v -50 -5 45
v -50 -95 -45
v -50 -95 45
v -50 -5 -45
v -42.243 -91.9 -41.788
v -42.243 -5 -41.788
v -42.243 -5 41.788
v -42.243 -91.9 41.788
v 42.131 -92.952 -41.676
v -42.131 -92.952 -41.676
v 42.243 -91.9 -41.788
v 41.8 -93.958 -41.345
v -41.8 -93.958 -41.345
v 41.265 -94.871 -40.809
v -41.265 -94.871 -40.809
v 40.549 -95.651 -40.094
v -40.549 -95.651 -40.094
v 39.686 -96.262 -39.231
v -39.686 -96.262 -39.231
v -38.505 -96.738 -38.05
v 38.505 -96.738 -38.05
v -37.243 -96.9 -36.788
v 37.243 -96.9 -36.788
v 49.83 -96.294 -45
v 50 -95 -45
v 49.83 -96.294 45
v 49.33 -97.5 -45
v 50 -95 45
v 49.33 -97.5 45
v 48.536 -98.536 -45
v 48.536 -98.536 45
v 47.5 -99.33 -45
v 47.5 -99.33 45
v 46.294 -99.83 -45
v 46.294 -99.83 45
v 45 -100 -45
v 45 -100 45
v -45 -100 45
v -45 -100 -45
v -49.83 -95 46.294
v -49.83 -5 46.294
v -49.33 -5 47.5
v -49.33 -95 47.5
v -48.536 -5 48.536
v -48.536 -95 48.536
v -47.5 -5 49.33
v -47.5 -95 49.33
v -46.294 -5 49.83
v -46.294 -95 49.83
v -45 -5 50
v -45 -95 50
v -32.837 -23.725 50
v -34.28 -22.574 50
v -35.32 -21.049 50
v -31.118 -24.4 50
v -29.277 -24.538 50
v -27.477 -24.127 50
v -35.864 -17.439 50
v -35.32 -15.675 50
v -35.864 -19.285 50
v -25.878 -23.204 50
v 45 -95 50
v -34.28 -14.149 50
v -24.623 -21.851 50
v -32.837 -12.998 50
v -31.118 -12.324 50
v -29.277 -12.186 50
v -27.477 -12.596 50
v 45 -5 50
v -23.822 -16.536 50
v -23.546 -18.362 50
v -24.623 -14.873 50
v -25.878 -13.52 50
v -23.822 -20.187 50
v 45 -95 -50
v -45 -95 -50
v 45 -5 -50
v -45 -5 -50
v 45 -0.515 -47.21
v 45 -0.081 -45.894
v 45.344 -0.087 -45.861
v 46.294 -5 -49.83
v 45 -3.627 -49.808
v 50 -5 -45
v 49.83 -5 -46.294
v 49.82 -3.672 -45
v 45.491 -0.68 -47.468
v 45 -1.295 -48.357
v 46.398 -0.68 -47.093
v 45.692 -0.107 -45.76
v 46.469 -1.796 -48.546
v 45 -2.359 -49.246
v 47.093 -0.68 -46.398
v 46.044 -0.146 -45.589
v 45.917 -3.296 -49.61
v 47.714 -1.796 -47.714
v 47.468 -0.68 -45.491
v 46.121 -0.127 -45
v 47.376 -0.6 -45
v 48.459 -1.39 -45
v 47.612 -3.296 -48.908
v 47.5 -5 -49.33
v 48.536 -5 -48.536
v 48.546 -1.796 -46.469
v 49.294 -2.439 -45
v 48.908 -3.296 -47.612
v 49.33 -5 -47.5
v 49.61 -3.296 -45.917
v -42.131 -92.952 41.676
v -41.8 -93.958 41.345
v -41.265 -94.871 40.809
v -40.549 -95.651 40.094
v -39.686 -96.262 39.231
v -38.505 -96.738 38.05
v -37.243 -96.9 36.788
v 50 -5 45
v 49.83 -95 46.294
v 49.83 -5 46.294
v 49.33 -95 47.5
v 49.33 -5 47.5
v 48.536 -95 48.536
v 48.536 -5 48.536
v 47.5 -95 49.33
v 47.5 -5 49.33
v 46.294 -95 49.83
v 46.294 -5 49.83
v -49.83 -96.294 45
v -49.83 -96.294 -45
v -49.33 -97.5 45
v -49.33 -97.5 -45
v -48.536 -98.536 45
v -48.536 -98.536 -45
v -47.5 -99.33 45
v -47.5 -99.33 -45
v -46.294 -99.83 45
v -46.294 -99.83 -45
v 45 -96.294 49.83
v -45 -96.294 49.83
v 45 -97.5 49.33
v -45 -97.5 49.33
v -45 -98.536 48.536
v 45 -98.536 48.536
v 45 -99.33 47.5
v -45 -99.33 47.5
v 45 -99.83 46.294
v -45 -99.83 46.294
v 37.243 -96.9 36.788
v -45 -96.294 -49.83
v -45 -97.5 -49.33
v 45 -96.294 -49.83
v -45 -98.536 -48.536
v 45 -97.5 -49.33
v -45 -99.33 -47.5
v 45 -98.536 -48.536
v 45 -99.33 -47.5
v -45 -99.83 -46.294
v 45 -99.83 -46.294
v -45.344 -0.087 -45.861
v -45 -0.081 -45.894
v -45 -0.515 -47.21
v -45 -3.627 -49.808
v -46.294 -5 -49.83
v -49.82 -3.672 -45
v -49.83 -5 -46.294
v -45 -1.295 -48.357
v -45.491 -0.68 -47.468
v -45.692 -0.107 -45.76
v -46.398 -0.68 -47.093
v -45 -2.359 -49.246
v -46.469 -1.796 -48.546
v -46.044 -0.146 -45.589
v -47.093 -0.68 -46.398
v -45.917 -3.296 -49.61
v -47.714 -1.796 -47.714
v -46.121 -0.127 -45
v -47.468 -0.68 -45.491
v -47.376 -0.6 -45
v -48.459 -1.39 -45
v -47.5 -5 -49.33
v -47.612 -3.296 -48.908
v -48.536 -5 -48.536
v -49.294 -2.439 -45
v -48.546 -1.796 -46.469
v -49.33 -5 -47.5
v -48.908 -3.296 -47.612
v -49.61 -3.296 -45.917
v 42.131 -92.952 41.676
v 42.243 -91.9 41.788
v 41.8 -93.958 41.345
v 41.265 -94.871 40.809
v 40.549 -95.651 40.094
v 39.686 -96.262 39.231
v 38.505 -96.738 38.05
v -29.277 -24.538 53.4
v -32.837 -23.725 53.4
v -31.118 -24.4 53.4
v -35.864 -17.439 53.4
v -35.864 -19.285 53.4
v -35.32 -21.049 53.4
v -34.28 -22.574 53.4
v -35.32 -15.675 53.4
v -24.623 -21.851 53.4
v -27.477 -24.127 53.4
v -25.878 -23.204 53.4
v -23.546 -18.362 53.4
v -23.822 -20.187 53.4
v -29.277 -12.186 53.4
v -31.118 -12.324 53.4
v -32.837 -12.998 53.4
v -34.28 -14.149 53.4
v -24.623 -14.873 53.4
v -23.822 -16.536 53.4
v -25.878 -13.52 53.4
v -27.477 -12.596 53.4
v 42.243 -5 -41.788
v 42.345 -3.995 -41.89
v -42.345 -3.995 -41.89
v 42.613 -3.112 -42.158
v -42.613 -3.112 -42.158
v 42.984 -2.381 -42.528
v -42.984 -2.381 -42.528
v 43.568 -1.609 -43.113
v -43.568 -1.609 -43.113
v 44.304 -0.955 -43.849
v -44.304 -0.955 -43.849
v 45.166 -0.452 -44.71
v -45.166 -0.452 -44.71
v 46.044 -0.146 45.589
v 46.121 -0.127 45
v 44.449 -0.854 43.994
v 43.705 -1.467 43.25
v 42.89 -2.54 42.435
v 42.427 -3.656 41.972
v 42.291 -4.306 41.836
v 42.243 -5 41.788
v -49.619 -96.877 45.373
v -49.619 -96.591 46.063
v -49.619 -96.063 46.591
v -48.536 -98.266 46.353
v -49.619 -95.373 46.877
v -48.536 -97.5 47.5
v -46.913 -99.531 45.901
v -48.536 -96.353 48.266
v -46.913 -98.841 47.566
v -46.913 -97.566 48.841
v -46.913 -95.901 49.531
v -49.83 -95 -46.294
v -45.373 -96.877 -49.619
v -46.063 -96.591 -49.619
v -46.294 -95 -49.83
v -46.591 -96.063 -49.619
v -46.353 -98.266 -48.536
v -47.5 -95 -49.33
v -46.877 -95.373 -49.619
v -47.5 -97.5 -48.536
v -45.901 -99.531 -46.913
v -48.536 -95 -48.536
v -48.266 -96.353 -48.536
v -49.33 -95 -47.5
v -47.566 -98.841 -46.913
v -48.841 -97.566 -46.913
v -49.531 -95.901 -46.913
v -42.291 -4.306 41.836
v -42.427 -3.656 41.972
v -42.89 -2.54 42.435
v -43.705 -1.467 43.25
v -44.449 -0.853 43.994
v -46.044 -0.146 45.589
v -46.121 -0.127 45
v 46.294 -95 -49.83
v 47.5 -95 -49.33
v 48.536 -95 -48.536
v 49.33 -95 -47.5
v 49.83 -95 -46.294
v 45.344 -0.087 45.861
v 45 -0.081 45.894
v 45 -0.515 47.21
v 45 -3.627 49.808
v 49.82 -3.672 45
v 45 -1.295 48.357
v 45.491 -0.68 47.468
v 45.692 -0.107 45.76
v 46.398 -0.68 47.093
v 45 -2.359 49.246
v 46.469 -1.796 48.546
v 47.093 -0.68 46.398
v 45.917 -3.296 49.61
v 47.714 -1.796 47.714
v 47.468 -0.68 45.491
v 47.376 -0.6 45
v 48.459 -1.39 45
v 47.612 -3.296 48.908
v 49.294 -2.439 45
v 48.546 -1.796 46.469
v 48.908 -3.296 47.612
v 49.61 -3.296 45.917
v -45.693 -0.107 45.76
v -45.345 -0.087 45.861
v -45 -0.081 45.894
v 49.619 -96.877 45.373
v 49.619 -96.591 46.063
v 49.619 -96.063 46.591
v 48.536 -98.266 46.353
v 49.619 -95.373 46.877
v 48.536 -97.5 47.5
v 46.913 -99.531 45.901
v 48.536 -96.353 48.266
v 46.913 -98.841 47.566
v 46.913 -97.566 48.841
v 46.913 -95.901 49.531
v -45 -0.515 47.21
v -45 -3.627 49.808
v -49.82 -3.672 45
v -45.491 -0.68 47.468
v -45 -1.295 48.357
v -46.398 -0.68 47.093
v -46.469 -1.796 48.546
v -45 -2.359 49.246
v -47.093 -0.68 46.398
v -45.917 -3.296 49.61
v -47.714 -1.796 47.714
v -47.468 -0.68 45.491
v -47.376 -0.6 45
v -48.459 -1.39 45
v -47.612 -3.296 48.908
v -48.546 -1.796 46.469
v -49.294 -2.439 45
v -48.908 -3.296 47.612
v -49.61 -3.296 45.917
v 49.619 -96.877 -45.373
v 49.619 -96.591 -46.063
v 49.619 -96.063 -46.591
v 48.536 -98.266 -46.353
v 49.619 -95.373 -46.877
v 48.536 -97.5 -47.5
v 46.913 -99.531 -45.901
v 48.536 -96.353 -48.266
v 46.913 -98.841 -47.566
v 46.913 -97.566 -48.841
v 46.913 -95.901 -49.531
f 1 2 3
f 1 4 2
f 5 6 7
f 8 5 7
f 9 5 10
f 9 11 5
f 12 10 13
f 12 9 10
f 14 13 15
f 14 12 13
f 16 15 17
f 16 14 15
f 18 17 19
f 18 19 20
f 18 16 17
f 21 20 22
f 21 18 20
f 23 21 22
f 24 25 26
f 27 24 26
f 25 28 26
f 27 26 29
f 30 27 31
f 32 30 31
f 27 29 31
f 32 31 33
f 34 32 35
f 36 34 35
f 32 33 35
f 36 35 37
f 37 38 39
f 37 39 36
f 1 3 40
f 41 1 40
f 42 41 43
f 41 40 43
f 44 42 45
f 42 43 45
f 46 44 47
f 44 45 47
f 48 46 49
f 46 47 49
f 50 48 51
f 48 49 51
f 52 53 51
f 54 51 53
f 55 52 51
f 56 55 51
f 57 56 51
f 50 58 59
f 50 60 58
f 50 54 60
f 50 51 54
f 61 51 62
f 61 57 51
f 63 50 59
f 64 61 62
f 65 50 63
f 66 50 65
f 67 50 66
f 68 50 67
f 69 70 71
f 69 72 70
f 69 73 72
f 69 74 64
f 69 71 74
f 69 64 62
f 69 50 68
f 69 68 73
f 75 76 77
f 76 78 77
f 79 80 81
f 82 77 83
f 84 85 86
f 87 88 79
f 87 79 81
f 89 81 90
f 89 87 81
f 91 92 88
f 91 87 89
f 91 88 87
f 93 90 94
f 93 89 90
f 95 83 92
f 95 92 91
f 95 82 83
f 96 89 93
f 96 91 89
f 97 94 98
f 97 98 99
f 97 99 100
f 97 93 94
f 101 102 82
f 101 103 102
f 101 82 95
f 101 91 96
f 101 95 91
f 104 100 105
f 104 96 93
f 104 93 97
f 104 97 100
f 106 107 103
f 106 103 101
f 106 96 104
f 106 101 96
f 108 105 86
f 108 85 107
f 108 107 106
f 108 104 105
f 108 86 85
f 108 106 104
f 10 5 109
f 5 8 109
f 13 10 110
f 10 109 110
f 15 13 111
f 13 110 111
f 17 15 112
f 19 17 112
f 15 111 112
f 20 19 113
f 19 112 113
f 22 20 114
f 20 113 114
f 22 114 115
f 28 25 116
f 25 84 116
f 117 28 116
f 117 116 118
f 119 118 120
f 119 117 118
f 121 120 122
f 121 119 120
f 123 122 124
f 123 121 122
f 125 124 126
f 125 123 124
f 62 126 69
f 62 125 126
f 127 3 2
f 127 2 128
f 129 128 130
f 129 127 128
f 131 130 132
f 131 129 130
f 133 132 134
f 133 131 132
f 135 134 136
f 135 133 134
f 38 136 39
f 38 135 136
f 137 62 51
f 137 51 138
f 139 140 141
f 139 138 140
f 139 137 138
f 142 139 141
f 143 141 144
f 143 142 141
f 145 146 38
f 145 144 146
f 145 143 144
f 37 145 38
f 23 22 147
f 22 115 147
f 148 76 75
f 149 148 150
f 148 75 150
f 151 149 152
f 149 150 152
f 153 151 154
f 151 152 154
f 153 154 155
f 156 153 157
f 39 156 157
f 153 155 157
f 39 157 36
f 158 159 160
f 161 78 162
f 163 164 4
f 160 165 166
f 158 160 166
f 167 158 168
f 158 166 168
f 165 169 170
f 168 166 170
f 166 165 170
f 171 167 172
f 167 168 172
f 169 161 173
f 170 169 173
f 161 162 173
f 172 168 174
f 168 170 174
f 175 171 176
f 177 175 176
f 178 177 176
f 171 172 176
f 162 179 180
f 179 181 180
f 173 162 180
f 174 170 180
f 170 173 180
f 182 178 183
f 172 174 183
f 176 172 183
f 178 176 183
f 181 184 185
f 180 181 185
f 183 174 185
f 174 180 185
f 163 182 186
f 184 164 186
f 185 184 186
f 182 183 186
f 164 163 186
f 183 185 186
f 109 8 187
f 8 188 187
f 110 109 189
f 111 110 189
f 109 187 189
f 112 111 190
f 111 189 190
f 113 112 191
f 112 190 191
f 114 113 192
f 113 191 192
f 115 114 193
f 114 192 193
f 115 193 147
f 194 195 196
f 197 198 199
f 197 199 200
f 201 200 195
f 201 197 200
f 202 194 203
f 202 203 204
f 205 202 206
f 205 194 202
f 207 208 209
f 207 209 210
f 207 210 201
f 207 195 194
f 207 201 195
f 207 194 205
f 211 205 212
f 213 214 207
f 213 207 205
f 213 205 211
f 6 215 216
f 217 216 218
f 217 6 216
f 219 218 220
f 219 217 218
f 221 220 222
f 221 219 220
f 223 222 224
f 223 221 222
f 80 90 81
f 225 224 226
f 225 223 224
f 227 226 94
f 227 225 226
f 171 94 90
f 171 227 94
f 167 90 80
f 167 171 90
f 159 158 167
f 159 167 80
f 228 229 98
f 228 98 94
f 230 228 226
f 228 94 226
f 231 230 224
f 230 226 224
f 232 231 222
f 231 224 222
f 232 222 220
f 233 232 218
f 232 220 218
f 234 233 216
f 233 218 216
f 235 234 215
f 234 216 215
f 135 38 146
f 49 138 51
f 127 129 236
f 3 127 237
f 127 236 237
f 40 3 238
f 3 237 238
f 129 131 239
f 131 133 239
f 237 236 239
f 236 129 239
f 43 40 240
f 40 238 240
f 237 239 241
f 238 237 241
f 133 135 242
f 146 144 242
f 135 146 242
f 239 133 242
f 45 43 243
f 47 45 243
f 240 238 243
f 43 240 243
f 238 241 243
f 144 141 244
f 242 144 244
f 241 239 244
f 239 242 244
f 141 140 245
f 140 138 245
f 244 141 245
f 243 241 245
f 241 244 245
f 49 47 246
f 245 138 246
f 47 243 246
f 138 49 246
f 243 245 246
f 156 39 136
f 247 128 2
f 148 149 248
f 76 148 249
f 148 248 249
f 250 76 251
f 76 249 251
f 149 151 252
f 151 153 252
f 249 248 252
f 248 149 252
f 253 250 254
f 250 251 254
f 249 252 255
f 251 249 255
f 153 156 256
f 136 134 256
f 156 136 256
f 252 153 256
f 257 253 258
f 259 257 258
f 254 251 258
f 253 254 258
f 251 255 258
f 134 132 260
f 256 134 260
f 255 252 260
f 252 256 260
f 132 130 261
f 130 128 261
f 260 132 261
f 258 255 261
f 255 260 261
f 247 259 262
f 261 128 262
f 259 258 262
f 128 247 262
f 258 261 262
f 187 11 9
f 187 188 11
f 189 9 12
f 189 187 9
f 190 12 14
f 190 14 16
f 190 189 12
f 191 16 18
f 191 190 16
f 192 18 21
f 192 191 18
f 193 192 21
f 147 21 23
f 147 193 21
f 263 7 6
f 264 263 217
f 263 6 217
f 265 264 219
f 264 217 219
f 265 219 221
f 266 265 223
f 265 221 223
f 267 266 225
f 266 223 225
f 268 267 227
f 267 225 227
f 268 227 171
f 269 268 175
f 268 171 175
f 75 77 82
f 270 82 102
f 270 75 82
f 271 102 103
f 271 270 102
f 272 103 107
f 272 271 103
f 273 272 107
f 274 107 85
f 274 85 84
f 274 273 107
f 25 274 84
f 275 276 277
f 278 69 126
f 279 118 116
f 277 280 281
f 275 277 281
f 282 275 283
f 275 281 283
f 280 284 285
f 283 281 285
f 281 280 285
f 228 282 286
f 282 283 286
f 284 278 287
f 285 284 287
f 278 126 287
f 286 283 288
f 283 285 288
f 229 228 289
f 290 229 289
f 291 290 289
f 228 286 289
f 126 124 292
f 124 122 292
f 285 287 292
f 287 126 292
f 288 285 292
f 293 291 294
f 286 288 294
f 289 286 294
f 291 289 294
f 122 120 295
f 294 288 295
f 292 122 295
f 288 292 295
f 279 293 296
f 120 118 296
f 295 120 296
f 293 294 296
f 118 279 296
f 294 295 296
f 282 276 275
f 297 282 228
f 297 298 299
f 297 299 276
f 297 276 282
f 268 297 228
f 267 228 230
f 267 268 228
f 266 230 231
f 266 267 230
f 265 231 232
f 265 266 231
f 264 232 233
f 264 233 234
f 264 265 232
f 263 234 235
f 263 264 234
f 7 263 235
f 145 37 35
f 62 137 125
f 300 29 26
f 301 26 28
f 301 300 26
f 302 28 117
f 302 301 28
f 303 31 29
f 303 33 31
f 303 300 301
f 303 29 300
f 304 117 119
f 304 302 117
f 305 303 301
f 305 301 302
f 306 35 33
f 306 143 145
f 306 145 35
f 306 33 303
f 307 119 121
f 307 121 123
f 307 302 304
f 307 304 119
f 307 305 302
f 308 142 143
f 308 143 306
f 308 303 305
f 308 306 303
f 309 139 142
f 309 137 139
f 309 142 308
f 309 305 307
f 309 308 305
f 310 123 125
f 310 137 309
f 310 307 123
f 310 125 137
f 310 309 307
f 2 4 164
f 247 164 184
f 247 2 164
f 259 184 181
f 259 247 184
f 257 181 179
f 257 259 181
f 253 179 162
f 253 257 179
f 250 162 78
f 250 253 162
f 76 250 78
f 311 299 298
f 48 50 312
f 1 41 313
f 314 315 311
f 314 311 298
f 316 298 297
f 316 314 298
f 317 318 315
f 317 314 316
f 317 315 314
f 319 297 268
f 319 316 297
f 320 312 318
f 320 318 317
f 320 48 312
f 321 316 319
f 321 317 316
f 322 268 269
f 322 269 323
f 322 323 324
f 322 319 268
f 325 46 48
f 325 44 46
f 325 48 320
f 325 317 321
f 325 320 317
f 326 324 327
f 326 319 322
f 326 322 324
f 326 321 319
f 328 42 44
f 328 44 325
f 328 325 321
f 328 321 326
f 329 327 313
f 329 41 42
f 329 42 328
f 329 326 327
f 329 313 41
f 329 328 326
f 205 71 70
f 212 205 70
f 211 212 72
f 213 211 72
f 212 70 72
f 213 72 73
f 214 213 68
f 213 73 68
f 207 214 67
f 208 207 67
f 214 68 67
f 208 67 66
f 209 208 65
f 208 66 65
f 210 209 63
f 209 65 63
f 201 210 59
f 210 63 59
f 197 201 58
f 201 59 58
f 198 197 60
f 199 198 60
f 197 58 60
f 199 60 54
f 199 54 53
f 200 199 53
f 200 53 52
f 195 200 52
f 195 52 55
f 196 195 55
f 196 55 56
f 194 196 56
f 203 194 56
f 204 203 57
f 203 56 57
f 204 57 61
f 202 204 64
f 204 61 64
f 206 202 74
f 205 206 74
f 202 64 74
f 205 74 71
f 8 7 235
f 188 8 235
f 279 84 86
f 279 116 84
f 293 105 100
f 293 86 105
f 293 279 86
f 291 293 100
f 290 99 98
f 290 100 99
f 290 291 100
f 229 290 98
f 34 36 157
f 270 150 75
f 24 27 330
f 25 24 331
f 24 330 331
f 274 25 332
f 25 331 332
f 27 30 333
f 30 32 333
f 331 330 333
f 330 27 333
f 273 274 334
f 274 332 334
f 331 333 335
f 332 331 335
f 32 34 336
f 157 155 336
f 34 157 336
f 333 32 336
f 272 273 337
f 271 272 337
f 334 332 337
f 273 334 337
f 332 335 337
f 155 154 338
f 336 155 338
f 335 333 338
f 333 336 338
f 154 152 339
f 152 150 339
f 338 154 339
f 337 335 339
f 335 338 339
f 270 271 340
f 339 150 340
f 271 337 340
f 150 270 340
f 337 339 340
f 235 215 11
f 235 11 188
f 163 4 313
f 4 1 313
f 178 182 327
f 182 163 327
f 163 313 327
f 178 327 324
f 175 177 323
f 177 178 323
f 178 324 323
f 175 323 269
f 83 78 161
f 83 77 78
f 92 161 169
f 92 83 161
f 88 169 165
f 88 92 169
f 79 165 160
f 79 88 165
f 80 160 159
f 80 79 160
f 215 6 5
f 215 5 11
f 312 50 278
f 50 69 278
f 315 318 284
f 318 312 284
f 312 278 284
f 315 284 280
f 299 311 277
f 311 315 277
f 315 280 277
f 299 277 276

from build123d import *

# Parameters (mm, degrees)
F0_W         = 100
F0_H         = 100
F1_DEPTH     = 100
F2_R         = 5
F3_W         = 84.485553205
F3_H         = 83.5751444101
F4_DEPTH     = 96.9
F5_R         = 5
F6_T1_DEPTH  = 84.485553205
F6_T3_DEPTH  = 83.5751444101
F6_T9_DEPTH  = 96.985553205
F6_T13_DEPTH = 96.0751444101
F6_T20_DEPTH = 96.985553205
F6_T24_DEPTH = 96.0751444101
F6_T31_DEPTH = 96.0751444101
F6_T35_DEPTH = 96.985553205
F6_T42_DEPTH = 96.0751444101
F6_T46_DEPTH = 96.985553205
F7_R         = 6.1934205271
F8_DEPTH     = 3.4


# Not quite as in the source:
# - a fillet or chamfer that OpenCascade refuses, or shapes differently, is made with other operations: its cross-section is extruded or revolved along the edge and cut away or added


with BuildPart() as f1:
    # F0 (on Front) → F1 (new body)
    with BuildSketch(Plane.XZ):
        Rectangle(F0_W, F0_H)
    extrude(amount=F1_DEPTH)

    # F2
    f2_edges = [f1.edges().sort_by_distance(p)[0] for p in [
        (0, -100, 50),
        (-50, -100, 0),
        (0, -100, -50),
        (50, -100, 0),
        (50, -50, -50),
        (-50, -50, -50),
        (0, 0, -50),
        (50, -50, 50),
        (-50, -50, 50),
        (0, 0, 50),
        (50, 0, 0),
        (-50, 0, 0),
    ]]
    fillet(f2_edges, radius=F2_R)

    # F3 (on Front) → F4 (cut)
    with BuildSketch(Plane.XZ):
        Rectangle(F3_W, F3_H)
    extrude(amount=F4_DEPTH, mode=Mode.SUBTRACT)

    # F5
    f5_edges = [f1.edges().sort_by_distance(p)[0] for p in [
        (0, -96.9, -41.787572),
        (42.242777, -96.9, 0),
        (0, -96.9, 41.787572),
        (-42.242777, -96.9, 0),
    ]]
    fillet(f5_edges, radius=F5_R)

    # F6: fillet of radius 5 on 8 edges, made by hand

    # F6_s2 → F6_t1 (cut)
    with BuildSketch(Plane.YZ.offset(-42.2427766025)):
        with BuildLine():
            ThreePointArc((-5, -41.7875722051), (-1.4644660941, -43.2520382991), (0, -46.7875722051))
            Line((0, -46.7875722051), (0, -41.7875722051))
            Line((0, -41.7875722051), (-5, -41.7875722051))
        make_face()
        with BuildLine():
            ThreePointArc((0, 46.7875722051), (-1.4644660941, 43.2520382991), (-5, 41.7875722051))
            Line((-5, 41.7875722051), (0, 41.7875722051))
            Line((0, 41.7875722051), (0, 46.7875722051))
        make_face()
    extrude(amount=F6_T1_DEPTH, mode=Mode.SUBTRACT)

    # F6_s4 → F6_t3 (cut)
    with BuildSketch(Plane.XY.offset(-41.7875722051)):
        with BuildLine():
            ThreePointArc((47.2427766025, 0), (43.7072426966, -1.4644660941), (42.2427766025, -5))
            Line((42.2427766025, -5), (42.2427766025, 0))
            Line((42.2427766025, 0), (47.2427766025, 0))
        make_face()
        with BuildLine():
            ThreePointArc((-42.2427766025, -5), (-43.7072426966, -1.4644660941), (-47.2427766025, 0))
            Line((-47.2427766025, 0), (-42.2427766025, 0))
            Line((-42.2427766025, 0), (-42.2427766025, -5))
        make_face()
    extrude(amount=F6_T3_DEPTH, mode=Mode.SUBTRACT)


with BuildPart() as f6_tool7:
    # F6_s8 → F6_t9 (new body)
    with BuildSketch(Plane.YZ.offset(-54.7427766025)):
        with BuildLine():
            ThreePointArc((-5, -41.7875722051), (-1.4644660941, -43.2520382991), (0, -46.7875722051))
            Line((0, -46.7875722051), (0, -41.7875722051))
            Line((0, -41.7875722051), (-5, -41.7875722051))
        make_face()
    extrude(amount=F6_T9_DEPTH)

    split(bisect_by=Plane.YZ.offset(-42.2427766025), keep=Keep.BOTTOM)


with BuildPart() as f6_tool11:
    # F6_s12 → F6_t13 (new body)
    with BuildSketch(Plane.XY.offset(41.7875722051)):
        with BuildLine():
            ThreePointArc((-42.2427766025, -5), (-43.7072426966, -1.4644660941), (-47.2427766025, 0))
            Line((-47.2427766025, 0), (-42.2427766025, 0))
            Line((-42.2427766025, 0), (-42.2427766025, -5))
        make_face()
    extrude(amount=-F6_T13_DEPTH)

    split(bisect_by=Plane.XY.offset(-41.7875722051), keep=Keep.BOTTOM)


with BuildPart() as f6_tool7_1:
    add(f6_tool7.part)

    # F6_t15: intersect F6_tool11
    add(f6_tool11.part, mode=Mode.INTERSECT)


with BuildPart() as f1_1:
    add(f1.part)

    # F6_t5: cut F6_tool7
    add(f6_tool7_1.part, mode=Mode.SUBTRACT)


with BuildPart() as f6_tool18:
    # F6_s19 → F6_t20 (new body)
    with BuildSketch(Plane.YZ.offset(-42.2427766025)):
        with BuildLine():
            ThreePointArc((-5, -41.7875722051), (-1.4644660941, -43.2520382991), (0, -46.7875722051))
            Line((0, -46.7875722051), (0, -41.7875722051))
            Line((0, -41.7875722051), (-5, -41.7875722051))
        make_face()
    extrude(amount=F6_T20_DEPTH)

    split(bisect_by=Plane.YZ.offset(42.2427766025), keep=Keep.TOP)


with BuildPart() as f6_tool22:
    # F6_s23 → F6_t24 (new body)
    with BuildSketch(Plane.XY.offset(-54.2875722051)):
        with BuildLine():
            ThreePointArc((47.2427766025, 0), (43.7072426966, -1.4644660941), (42.2427766025, -5))
            Line((42.2427766025, -5), (42.2427766025, 0))
            Line((42.2427766025, 0), (47.2427766025, 0))
        make_face()
    extrude(amount=F6_T24_DEPTH)

    split(bisect_by=Plane.XY.offset(-41.7875722051), keep=Keep.BOTTOM)


with BuildPart() as f6_tool18_1:
    add(f6_tool18.part)

    # F6_t26: intersect F6_tool22
    add(f6_tool22.part, mode=Mode.INTERSECT)


with BuildPart() as f1_2:
    add(f1_1.part)

    # F6_t16: cut F6_tool18
    add(f6_tool18_1.part, mode=Mode.SUBTRACT)


with BuildPart() as f6_tool29:
    # F6_s30 → F6_t31 (new body)
    with BuildSketch(Plane.XY.offset(-41.7875722051)):
        with BuildLine():
            ThreePointArc((47.2427766025, 0), (43.7072426966, -1.4644660941), (42.2427766025, -5))
            Line((42.2427766025, -5), (42.2427766025, 0))
            Line((42.2427766025, 0), (47.2427766025, 0))
        make_face()
    extrude(amount=F6_T31_DEPTH)

    split(bisect_by=Plane.XY.offset(41.7875722051), keep=Keep.TOP)


with BuildPart() as f6_tool33:
    # F6_s34 → F6_t35 (new body)
    with BuildSketch(Plane.YZ.offset(54.7427766025)):
        with BuildLine():
            ThreePointArc((0, 46.7875722051), (-1.4644660941, 43.2520382991), (-5, 41.7875722051))
            Line((-5, 41.7875722051), (0, 41.7875722051))
            Line((0, 41.7875722051), (0, 46.7875722051))
        make_face()
    extrude(amount=-F6_T35_DEPTH)

    split(bisect_by=Plane.YZ.offset(42.2427766025), keep=Keep.TOP)


with BuildPart() as f6_tool29_1:
    add(f6_tool29.part)

    # F6_t37: intersect F6_tool33
    add(f6_tool33.part, mode=Mode.INTERSECT)


with BuildPart() as f1_3:
    add(f1_2.part)

    # F6_t27: cut F6_tool29
    add(f6_tool29_1.part, mode=Mode.SUBTRACT)


with BuildPart() as f6_tool40:
    # F6_s41 → F6_t42 (new body)
    with BuildSketch(Plane.XY.offset(54.2875722051)):
        with BuildLine():
            ThreePointArc((-42.2427766025, -5), (-43.7072426966, -1.4644660941), (-47.2427766025, 0))
            Line((-47.2427766025, 0), (-42.2427766025, 0))
            Line((-42.2427766025, 0), (-42.2427766025, -5))
        make_face()
    extrude(amount=-F6_T42_DEPTH)

    split(bisect_by=Plane.XY.offset(41.7875722051), keep=Keep.TOP)


with BuildPart() as f6_tool44:
    # F6_s45 → F6_t46 (new body)
    with BuildSketch(Plane.YZ.offset(42.2427766025)):
        with BuildLine():
            ThreePointArc((0, 46.7875722051), (-1.4644660941, 43.2520382991), (-5, 41.7875722051))
            Line((-5, 41.7875722051), (0, 41.7875722051))
            Line((0, 41.7875722051), (0, 46.7875722051))
        make_face()
    extrude(amount=-F6_T46_DEPTH)

    split(bisect_by=Plane.YZ.offset(-42.2427766025), keep=Keep.BOTTOM)


with BuildPart() as f6_tool40_1:
    add(f6_tool40.part)

    # F6_t48: intersect F6_tool44
    add(f6_tool44.part, mode=Mode.INTERSECT)


with BuildPart() as f1_4:
    add(f1_3.part)

    # F6_t38: cut F6_tool40
    add(f6_tool40_1.part, mode=Mode.SUBTRACT)

    # F7 (on face) → F8 (join)
    with BuildSketch(Plane.XY.offset(50)):
        with Locations((-29.7398809344, -18.3617770672)):
            Circle(F7_R)
    extrude(amount=F8_DEPTH)


solid = f1_4.part
